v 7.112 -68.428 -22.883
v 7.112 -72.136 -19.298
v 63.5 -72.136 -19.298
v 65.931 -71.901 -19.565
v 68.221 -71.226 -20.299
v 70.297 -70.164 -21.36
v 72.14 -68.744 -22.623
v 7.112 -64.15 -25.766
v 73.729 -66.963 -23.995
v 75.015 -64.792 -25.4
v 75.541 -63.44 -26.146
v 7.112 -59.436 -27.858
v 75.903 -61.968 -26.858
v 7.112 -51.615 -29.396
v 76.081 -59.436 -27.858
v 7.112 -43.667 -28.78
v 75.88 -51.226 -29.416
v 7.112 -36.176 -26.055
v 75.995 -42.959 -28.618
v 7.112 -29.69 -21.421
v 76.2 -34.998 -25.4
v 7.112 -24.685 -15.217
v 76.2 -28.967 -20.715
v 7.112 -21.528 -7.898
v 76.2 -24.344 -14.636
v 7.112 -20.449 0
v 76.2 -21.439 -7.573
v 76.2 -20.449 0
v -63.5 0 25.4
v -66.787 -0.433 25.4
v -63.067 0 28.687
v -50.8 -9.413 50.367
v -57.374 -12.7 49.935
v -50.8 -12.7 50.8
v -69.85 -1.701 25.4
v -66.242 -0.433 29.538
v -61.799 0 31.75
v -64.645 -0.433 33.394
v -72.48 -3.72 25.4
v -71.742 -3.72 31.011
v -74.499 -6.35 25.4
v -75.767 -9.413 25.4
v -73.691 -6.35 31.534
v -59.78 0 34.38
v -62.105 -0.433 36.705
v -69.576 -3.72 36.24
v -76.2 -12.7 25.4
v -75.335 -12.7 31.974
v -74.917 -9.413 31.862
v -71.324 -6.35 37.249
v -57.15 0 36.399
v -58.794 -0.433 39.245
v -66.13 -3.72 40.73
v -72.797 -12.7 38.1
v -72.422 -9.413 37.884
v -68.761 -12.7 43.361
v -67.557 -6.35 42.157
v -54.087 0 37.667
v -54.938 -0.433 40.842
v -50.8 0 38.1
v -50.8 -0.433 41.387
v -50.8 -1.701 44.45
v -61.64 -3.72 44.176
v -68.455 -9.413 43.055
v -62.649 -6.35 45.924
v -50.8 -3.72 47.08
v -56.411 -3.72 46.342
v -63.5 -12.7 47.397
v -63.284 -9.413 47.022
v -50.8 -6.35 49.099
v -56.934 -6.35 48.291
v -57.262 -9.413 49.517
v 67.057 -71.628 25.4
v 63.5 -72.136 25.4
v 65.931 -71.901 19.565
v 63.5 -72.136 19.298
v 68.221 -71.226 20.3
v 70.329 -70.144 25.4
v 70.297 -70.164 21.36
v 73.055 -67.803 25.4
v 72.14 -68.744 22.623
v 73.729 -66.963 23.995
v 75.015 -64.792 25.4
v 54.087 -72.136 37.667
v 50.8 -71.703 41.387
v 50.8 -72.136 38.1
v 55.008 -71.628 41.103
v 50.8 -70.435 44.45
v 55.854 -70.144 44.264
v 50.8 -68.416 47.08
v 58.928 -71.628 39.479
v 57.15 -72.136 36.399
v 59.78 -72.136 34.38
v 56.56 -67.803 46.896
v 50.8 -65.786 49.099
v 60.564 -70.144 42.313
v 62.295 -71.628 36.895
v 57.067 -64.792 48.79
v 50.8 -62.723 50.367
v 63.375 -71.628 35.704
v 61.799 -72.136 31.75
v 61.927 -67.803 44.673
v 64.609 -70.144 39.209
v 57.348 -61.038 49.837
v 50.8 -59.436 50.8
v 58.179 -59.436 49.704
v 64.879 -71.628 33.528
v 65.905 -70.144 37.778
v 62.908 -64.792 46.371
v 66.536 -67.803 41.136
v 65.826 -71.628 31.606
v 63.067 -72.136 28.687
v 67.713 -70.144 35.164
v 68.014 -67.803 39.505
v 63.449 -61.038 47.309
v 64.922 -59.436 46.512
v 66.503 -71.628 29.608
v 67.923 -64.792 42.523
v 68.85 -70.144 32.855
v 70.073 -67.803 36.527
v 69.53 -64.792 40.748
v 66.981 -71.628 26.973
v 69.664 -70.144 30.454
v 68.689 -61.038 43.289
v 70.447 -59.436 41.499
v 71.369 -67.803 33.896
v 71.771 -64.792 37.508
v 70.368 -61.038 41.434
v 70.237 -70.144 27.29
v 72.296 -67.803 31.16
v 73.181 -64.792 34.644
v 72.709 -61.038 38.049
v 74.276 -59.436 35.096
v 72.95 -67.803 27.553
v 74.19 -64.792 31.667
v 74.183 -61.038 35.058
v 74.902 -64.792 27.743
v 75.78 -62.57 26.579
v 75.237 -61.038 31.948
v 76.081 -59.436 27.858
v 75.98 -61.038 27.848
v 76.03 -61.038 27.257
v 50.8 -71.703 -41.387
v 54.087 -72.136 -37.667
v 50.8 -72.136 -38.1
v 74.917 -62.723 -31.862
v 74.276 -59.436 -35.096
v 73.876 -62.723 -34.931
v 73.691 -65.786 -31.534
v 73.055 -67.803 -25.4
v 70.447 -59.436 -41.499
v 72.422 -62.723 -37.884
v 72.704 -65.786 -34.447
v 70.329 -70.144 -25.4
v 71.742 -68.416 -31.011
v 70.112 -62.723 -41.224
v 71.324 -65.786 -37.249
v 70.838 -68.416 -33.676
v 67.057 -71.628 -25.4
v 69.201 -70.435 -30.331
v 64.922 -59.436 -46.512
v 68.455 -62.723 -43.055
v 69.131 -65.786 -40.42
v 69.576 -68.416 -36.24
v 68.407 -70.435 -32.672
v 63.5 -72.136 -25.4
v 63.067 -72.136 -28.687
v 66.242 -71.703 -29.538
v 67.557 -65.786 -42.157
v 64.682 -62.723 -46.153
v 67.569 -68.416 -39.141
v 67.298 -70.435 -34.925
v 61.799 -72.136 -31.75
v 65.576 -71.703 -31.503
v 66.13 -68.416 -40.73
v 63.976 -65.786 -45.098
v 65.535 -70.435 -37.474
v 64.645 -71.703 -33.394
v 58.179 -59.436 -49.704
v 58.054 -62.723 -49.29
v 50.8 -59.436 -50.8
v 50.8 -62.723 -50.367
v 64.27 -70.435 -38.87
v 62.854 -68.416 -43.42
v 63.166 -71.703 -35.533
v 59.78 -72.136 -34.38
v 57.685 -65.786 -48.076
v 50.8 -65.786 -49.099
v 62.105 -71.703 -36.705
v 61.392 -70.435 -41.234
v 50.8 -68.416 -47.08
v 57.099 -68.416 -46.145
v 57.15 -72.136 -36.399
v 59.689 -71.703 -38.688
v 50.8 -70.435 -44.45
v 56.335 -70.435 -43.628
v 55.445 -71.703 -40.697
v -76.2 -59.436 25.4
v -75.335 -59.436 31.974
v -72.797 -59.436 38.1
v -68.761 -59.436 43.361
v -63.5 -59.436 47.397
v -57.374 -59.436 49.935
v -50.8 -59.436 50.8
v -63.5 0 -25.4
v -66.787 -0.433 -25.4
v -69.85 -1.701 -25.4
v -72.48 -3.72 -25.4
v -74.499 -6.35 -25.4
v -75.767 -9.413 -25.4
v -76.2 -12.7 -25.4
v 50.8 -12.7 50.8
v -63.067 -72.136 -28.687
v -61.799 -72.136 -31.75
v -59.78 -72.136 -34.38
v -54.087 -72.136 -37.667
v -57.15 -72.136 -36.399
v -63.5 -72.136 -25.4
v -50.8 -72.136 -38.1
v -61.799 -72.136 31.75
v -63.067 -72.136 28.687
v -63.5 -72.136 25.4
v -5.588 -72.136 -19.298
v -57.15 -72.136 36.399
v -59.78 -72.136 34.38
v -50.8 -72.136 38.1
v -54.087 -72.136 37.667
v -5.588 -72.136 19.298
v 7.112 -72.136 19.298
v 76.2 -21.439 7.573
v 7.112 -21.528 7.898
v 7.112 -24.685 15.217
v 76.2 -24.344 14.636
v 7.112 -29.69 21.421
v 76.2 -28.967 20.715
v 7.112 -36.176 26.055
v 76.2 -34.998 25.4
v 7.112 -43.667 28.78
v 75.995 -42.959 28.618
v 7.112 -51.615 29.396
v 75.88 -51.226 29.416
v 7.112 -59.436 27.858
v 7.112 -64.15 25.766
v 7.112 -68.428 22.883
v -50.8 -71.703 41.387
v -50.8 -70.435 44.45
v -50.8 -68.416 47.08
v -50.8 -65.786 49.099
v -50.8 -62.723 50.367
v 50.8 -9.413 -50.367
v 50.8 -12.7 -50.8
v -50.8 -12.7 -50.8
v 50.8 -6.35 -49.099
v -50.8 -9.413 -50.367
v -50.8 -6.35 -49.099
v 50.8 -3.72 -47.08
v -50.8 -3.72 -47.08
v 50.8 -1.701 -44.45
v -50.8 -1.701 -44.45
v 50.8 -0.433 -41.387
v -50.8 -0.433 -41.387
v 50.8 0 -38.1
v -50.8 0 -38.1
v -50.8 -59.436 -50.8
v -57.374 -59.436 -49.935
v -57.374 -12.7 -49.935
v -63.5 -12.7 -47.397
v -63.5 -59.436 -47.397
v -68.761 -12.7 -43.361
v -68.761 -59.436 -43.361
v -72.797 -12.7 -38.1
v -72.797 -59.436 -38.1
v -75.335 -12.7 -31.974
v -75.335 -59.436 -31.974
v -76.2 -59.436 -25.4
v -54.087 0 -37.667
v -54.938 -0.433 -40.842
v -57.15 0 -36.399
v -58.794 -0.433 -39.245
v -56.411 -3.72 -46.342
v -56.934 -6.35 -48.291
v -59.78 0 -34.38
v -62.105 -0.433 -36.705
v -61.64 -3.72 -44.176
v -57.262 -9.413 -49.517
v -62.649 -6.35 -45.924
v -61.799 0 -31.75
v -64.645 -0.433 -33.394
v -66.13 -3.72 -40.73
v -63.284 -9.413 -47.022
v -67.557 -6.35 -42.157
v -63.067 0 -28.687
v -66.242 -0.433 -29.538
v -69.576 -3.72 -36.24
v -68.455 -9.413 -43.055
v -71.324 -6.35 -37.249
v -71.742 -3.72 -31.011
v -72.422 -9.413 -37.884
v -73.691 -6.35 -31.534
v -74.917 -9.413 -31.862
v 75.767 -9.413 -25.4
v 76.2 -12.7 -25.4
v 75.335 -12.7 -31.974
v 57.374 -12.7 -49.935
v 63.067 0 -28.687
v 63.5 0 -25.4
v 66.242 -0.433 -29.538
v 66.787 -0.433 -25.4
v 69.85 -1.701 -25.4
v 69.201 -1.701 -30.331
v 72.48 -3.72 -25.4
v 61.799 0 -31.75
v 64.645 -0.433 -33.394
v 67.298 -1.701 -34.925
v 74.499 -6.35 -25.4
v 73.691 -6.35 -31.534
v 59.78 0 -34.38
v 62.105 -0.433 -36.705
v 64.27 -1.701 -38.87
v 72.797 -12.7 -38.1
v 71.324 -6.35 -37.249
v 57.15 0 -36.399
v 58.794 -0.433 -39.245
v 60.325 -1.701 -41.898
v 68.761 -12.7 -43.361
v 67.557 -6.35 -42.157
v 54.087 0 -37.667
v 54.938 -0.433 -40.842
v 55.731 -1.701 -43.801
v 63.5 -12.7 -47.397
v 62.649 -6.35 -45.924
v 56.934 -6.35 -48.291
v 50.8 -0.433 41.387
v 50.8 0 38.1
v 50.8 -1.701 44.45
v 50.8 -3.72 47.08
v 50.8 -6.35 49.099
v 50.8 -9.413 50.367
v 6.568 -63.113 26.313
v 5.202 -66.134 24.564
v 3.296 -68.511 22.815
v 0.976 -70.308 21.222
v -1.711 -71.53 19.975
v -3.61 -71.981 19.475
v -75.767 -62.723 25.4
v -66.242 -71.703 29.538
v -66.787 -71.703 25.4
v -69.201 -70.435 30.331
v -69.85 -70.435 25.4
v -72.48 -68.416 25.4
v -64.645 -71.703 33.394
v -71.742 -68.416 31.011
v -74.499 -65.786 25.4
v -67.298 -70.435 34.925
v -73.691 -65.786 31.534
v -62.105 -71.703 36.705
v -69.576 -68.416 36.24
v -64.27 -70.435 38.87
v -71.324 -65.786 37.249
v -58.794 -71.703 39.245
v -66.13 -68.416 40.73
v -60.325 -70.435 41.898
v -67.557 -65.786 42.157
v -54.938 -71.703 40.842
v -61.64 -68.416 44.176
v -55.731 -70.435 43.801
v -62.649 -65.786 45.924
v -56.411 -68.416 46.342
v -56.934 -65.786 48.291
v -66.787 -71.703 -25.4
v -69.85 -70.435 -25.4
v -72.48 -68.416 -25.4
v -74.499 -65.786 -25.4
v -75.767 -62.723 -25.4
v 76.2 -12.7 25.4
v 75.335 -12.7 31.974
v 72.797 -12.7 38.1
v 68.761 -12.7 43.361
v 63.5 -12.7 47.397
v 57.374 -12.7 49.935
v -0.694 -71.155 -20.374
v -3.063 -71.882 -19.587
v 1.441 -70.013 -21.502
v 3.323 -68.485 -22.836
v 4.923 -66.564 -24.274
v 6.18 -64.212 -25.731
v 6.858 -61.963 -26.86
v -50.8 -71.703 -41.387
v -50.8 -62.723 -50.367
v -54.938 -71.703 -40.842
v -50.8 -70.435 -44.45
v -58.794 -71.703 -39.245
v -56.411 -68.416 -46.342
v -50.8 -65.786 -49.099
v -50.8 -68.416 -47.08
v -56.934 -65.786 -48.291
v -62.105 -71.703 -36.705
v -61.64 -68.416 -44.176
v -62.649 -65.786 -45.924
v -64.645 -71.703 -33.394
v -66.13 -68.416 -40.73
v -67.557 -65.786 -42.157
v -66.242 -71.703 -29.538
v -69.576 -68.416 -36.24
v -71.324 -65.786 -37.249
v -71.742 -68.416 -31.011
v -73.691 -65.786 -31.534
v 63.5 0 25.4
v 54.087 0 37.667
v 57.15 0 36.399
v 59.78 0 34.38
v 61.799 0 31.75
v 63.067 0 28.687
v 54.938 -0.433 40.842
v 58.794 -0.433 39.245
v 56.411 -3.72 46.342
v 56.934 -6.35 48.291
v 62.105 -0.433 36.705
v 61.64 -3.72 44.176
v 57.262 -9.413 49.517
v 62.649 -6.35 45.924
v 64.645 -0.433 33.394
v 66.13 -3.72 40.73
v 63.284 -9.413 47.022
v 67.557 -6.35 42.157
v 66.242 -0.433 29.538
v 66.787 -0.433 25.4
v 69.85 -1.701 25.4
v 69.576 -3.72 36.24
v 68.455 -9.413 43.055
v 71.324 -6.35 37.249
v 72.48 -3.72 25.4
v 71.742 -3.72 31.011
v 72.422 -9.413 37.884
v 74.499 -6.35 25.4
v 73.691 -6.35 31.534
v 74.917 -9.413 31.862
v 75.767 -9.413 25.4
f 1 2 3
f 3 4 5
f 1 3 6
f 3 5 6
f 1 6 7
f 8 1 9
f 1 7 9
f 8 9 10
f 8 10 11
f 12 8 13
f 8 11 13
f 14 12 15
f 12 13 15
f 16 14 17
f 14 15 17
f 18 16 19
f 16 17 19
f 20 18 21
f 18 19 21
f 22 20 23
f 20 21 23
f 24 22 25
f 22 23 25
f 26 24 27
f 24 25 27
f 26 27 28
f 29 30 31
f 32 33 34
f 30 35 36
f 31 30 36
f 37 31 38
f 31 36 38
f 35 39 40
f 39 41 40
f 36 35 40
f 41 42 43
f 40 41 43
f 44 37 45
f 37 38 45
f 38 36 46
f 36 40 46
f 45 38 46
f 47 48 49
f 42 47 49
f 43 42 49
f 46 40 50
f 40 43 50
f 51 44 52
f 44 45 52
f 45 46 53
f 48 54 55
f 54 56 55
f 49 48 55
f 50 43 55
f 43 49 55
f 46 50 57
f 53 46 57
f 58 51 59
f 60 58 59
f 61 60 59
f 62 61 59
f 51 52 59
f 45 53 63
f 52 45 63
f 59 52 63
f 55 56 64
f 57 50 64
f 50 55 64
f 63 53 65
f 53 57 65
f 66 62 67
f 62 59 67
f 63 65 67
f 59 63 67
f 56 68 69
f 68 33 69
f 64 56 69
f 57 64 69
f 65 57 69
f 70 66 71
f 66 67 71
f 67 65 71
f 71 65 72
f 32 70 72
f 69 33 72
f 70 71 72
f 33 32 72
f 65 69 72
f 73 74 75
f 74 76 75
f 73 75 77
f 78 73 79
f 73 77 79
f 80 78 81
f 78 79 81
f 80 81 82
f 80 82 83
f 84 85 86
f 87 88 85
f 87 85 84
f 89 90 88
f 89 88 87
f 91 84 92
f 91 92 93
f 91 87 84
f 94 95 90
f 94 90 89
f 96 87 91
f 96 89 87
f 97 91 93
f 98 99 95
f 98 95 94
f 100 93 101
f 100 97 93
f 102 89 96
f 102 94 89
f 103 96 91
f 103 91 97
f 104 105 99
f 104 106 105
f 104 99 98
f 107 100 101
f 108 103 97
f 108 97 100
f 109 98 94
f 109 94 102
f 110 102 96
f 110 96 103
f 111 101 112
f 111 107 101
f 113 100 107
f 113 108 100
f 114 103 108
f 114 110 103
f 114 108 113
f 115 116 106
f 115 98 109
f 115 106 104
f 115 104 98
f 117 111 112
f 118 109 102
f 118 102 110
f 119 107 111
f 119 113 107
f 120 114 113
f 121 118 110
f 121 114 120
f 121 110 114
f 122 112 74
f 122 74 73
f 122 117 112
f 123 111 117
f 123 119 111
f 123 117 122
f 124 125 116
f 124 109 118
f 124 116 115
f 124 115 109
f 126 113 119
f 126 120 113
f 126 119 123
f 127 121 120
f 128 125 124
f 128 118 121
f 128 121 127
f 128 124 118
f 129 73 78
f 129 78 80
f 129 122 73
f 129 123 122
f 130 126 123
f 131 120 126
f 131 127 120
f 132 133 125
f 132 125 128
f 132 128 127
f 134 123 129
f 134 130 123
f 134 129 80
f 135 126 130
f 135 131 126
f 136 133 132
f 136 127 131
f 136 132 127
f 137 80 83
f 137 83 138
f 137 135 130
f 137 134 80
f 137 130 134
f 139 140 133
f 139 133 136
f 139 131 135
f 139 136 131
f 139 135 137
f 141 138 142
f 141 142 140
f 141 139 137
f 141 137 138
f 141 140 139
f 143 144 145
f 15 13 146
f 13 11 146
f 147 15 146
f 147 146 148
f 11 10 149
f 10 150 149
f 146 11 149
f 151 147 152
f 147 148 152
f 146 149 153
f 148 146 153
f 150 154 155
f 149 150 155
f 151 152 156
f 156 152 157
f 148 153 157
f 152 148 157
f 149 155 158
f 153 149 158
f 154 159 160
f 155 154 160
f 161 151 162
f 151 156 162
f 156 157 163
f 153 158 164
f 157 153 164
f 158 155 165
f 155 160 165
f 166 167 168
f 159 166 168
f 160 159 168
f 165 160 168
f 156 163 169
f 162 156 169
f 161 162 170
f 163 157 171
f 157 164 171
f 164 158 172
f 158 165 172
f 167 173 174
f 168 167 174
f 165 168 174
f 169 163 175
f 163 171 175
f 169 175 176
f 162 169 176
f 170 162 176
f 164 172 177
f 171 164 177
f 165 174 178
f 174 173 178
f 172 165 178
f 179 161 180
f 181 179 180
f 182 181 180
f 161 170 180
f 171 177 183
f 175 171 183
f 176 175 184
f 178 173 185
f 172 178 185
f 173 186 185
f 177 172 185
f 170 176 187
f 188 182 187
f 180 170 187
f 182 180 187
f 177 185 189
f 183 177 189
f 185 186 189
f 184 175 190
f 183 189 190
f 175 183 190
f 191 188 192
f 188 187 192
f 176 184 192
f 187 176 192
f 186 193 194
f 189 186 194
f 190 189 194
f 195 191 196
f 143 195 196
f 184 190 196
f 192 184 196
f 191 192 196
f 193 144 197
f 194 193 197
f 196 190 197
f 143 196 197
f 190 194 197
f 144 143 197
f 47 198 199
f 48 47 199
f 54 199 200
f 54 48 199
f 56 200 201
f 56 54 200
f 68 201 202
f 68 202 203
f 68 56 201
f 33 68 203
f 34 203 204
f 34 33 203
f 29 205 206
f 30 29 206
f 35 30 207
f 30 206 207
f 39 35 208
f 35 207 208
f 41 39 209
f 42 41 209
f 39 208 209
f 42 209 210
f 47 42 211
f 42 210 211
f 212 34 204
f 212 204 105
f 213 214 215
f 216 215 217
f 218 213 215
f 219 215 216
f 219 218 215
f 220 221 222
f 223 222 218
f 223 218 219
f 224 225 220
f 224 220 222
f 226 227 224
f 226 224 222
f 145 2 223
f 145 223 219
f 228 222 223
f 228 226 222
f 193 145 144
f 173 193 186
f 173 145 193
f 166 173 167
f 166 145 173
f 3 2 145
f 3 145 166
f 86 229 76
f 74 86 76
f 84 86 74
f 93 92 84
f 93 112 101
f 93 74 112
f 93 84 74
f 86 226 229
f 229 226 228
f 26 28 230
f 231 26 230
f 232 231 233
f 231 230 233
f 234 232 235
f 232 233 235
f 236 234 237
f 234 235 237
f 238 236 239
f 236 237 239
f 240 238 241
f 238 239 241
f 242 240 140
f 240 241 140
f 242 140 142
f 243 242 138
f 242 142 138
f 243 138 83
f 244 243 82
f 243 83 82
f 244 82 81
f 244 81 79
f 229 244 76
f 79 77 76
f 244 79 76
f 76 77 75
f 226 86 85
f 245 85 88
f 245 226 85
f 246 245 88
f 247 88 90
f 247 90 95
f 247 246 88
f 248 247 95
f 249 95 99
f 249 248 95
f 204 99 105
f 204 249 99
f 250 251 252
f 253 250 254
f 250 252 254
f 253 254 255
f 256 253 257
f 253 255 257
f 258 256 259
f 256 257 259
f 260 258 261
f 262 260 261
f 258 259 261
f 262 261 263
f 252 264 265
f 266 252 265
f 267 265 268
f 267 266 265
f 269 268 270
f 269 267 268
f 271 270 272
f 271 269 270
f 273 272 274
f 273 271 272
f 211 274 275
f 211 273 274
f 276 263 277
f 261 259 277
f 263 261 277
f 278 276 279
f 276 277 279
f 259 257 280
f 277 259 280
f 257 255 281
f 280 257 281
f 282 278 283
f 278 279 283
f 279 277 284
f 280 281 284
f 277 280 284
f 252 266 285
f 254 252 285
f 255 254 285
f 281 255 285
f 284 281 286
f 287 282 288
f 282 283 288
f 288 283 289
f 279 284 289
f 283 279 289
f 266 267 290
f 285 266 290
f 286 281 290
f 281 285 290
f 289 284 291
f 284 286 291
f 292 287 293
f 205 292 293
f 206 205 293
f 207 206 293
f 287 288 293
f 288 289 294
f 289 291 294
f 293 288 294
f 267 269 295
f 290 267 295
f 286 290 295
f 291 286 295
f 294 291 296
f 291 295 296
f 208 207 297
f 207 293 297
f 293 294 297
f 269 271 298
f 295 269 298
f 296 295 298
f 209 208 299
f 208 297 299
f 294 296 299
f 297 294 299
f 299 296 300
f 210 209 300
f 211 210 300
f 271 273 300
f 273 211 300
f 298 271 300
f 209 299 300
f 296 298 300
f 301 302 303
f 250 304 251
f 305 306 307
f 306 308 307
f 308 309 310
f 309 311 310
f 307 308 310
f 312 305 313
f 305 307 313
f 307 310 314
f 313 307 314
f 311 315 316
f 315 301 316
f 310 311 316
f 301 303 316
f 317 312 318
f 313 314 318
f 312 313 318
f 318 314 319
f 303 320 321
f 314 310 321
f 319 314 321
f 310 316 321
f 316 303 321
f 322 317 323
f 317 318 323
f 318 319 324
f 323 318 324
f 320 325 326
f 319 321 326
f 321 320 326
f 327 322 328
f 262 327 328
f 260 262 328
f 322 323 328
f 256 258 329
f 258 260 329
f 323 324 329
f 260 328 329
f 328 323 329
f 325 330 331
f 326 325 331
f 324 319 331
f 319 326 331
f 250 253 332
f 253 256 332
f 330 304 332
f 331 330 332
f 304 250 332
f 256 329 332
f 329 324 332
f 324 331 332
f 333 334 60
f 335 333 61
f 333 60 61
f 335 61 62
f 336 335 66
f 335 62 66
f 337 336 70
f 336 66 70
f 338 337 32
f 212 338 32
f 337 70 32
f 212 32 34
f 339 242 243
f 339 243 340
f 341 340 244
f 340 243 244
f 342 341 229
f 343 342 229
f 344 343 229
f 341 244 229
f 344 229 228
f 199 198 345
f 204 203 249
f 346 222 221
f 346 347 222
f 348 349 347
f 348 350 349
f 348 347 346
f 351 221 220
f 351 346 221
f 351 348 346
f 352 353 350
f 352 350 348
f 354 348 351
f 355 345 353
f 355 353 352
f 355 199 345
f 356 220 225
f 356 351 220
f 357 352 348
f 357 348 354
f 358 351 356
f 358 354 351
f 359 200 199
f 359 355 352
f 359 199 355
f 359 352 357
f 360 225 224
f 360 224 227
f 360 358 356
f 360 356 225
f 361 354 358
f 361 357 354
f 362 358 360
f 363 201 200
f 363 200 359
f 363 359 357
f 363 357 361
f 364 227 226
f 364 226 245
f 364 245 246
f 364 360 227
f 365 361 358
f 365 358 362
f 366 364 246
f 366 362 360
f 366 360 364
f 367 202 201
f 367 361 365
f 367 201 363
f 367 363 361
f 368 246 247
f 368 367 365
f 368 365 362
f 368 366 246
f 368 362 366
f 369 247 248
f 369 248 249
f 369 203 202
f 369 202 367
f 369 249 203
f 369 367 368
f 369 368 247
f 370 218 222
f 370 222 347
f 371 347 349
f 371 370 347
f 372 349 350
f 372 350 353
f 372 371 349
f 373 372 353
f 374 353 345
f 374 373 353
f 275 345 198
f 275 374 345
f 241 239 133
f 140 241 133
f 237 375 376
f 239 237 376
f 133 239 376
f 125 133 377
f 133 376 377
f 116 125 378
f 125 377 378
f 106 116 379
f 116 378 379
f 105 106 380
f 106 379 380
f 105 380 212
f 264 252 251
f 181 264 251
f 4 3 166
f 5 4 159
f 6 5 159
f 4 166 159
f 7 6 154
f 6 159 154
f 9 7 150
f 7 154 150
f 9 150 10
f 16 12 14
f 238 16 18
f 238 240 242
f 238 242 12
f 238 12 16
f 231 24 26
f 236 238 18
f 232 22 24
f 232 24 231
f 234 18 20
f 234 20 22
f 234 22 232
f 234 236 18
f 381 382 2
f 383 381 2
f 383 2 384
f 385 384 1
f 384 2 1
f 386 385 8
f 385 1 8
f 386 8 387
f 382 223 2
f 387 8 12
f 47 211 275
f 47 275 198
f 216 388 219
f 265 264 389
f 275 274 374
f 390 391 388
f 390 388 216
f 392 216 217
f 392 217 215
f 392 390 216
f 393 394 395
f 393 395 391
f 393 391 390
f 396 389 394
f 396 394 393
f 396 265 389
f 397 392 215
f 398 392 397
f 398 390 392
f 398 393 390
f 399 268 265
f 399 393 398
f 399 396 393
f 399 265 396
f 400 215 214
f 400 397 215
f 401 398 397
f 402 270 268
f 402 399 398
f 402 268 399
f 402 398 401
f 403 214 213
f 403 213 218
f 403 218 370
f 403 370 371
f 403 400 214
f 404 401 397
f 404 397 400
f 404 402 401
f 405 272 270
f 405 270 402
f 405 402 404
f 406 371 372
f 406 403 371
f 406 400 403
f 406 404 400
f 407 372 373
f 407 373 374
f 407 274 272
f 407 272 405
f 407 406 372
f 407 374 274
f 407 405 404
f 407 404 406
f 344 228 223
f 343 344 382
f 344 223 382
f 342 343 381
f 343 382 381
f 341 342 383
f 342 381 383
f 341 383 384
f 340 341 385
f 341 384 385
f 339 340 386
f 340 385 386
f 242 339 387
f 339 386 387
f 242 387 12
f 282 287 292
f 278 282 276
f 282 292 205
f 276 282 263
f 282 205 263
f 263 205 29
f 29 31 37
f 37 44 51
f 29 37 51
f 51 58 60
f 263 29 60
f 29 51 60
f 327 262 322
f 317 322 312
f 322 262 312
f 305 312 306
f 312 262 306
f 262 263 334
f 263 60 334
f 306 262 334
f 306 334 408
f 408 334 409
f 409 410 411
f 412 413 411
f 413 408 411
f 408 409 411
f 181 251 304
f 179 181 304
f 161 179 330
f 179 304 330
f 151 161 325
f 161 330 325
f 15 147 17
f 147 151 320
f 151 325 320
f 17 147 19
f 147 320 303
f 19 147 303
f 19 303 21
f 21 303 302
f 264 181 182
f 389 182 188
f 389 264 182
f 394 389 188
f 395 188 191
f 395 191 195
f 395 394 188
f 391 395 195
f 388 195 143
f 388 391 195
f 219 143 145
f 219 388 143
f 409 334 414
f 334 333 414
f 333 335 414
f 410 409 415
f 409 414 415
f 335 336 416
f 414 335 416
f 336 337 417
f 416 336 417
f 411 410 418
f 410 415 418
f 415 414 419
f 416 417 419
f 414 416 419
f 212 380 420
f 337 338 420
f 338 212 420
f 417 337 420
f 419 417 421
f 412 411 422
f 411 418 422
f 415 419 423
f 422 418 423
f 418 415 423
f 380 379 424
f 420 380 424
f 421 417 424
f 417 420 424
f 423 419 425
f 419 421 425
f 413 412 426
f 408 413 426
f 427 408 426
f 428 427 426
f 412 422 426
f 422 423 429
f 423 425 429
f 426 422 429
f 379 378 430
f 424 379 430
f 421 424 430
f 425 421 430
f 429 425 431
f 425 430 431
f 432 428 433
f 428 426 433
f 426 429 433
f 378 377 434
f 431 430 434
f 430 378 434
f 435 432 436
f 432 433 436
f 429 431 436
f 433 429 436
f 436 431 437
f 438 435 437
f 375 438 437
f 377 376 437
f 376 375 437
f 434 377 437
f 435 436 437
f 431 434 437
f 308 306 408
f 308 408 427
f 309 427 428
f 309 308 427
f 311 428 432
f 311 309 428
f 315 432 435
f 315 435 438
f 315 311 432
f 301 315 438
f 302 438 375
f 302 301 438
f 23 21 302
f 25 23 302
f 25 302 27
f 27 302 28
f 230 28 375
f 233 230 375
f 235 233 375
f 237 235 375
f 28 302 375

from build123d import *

# Parameters (mm, degrees)
F0_W         = 152.4
F0_H         = 101.6
F1_DEPTH     = 72.136
F3_DEPTH     = 69.088
F4_T1_DEPTH  = 199.136
F5_T1_DEPTH  = 101.6
F5_T3_DEPTH  = 50.8
F5_T5_DEPTH  = 37.8518945456
F5_T7_DEPTH  = 37.8518945456
F5_T12_DEPTH = 102.0962109088
F5_S13_R     = 29.4462721735
F5_T14_DEPTH = 53
F5_T16_ANGLE = 89.9999999994
F5_T18_ANGLE = 89.9999999994
F5_T20_ANGLE = 89.9999999994
F5_T22_ANGLE = 89.9999999994
F5_T24_ANGLE = 89.9999999994
F5_T26_ANGLE = 89.9999999994
F5_T28_ANGLE = 89.9999999994
F5_T30_ANGLE = 89.9999999994


# Not quite as in the source:
# - a fillet or chamfer that OpenCascade refuses, or shapes differently, is made with other operations: its cross-section is extruded or revolved along the edge and cut away or added


with BuildPart() as f1:
    # F0 (on Front) → F1 (new body)
    with BuildSketch(Plane.XZ):
        Rectangle(F0_W, F0_H)
    extrude(amount=F1_DEPTH)

    # F2 (on face) → F3 (cut)
    with BuildSketch(Plane.YZ.offset(76.2)):
        with BuildLine():
            Line((-72.136, -19.2981054544), (-72.136, 19.2981054544))
            ThreePointArc((-72.136, 19.2981054544), (-79.3411824793, 0), (-72.136, -19.2981054544))
        make_face()
        with BuildLine():
            ThreePointArc((-72.136, -19.2981054544), (-39.5952558372, -27.5862295855), (-20.4486381322, 0))
            ThreePointArc((-20.4486381322, 0), (-39.5952558372, 27.5862295855), (-72.136, 19.2981054544))
            Line((-72.136, 19.2981054544), (-72.136, -19.2981054544))
        make_face()
    extrude(amount=-F3_DEPTH, mode=Mode.SUBTRACT)

    # F4: fillet of radius 25.4 on 4 edges, made by hand

    # F4_s2 → F4_t1 (cut)
    with BuildSketch(Plane.XZ.offset(-63.5)):
        with BuildLine():
            ThreePointArc((50.8, -50.8), (68.7605122421, -43.3605122421), (76.2, -25.4))
            Line((76.2, -25.4), (76.2, -50.8))
            Line((76.2, -50.8), (50.8, -50.8))
        make_face()
        with BuildLine():
            ThreePointArc((-50.8, -50.8), (-68.7605122421, -43.3605122421), (-76.2, -25.4))
            Line((-76.2, -25.4), (-76.2, -50.8))
            Line((-76.2, -50.8), (-50.8, -50.8))
        make_face()
        with BuildLine():
            ThreePointArc((76.2, 25.4), (68.7605122421, 43.3605122421), (50.8, 50.8))
            Line((50.8, 50.8), (76.2, 50.8))
            Line((76.2, 50.8), (76.2, 25.4))
        make_face()
        with BuildLine():
            ThreePointArc((-76.2, 25.4), (-68.7605122421, 43.3605122421), (-50.8, 50.8))
            Line((-50.8, 50.8), (-76.2, 50.8))
            Line((-76.2, 50.8), (-76.2, 25.4))
        make_face()
    extrude(amount=F4_T1_DEPTH, mode=Mode.SUBTRACT)

    # F5: fillet of radius 12.7 on 16 edges, made by hand

    # F5_s2 → F5_t1 (cut)
    with BuildSketch(Plane.YZ.offset(-50.8)):
        with BuildLine():
            ThreePointArc((-72.136, 38.1), (-68.4162561211, 47.0802561211), (-59.436, 50.8))
            Line((-59.436, 50.8), (-72.136, 50.8))
            Line((-72.136, 50.8), (-72.136, 38.1))
        make_face()
        with BuildLine():
            ThreePointArc((0, 38.1), (-3.7197438789, 47.0802561211), (-12.7, 50.8))
            Line((-12.7, 50.8), (0, 50.8))
            Line((0, 50.8), (0, 38.1))
        make_face()
        with BuildLine():
            ThreePointArc((-12.7, -50.8), (-3.7197438789, -47.0802561211), (0, -38.1))
            Line((0, -38.1), (0, -50.8))
            Line((0, -50.8), (-12.7, -50.8))
        make_face()
        with BuildLine():
            ThreePointArc((-59.436, -50.8), (-68.4162561211, -47.0802561211), (-72.136, -38.1))
            Line((-72.136, -38.1), (-72.136, -50.8))
            Line((-72.136, -50.8), (-59.436, -50.8))
        make_face()
    extrude(amount=F5_T1_DEPTH, mode=Mode.SUBTRACT)

    # F5_s4 → F5_t3 (cut)
    with BuildSketch(Plane.XY.offset(-25.4)):
        with BuildLine():
            ThreePointArc((-63.5, 0), (-72.4802561211, -3.7197438789), (-76.2, -12.7))
            Line((-76.2, -12.7), (-76.2, 0))
            Line((-76.2, 0), (-63.5, 0))
        make_face()
        with BuildLine():
            ThreePointArc((63.5, 0), (72.4802561211, -3.7197438789), (76.2, -12.7))
            Line((76.2, -12.7), (76.2, 0))
            Line((76.2, 0), (63.5, 0))
        make_face()
        with BuildLine():
            ThreePointArc((-63.5, -72.136), (-72.4802561211, -68.4162561211), (-76.2, -59.436))
            Line((-76.2, -59.436), (-76.2, -72.136))
            Line((-76.2, -72.136), (-63.5, -72.136))
        make_face()
    extrude(amount=F5_T3_DEPTH, mode=Mode.SUBTRACT)

    # F5_s6 → F5_t5 (cut)
    with BuildSketch(Plane.XY.offset(-12.4518945456)):
        with BuildLine():
            ThreePointArc((63.5, -72.136), (72.4802561211, -68.4162561211), (76.2, -59.436))
            Line((76.2, -59.436), (76.2, -72.136))
            Line((76.2, -72.136), (63.5, -72.136))
        make_face()
    extrude(amount=F5_T5_DEPTH, mode=Mode.SUBTRACT)

    # F5_s8 → F5_t7 (cut)
    with BuildSketch(Plane.XY.offset(-25.4)):
        with BuildLine():
            ThreePointArc((63.5, -72.136), (72.4802561211, -68.4162561211), (76.2, -59.436))
            Line((76.2, -59.436), (76.2, -72.136))
            Line((76.2, -72.136), (63.5, -72.136))
        make_face()
    extrude(amount=F5_T7_DEPTH, mode=Mode.SUBTRACT)


with BuildPart() as f5_tool10:
    # F5_s11 → F5_t12 (new body)
    with BuildSketch(Plane.XY.offset(-51.0481054544)):
        with BuildLine():
            ThreePointArc((-5.588, -72.136), (3.3922561211, -68.4162561211), (7.112, -59.436))
            Line((7.112, -59.436), (7.112, -72.136))
            Line((7.112, -72.136), (-5.588, -72.136))
        make_face()
    extrude(amount=F5_T12_DEPTH)

    # F5_s13 → F5_t14 (intersect, symmetric)
    with BuildSketch(Plane.YZ.offset(0.8)):
        with Locations((-49.8949103057, 0)):
            Circle(F5_S13_R)
    extrude(amount=F5_T14_DEPTH, both=True, mode=Mode.INTERSECT)


with BuildPart() as f1_1:
    add(f1.part)

    # F5_t9: cut F5_tool10
    add(f5_tool10.part, mode=Mode.SUBTRACT)

    # F5_s15 → F5_t16 (revolve, cut)
    with BuildSketch(Plane.YZ.offset(-50.7999999999)):
        with BuildLine():
            ThreePointArc((0, -38.1), (-3.7197438789, -47.0802561211), (-12.7, -50.8))
            Line((-12.7, -50.8), (0, -50.8))
            Line((0, -50.8), (0, -38.1))
        make_face()
    revolve(axis=Axis((-50.7999999999, 0, -25.3999999999), (0, 1, 0)), revolution_arc=F5_T16_ANGLE, mode=Mode.SUBTRACT)

    # F5_s17 → F5_t18 (revolve, cut)
    with BuildSketch(Plane.XY.offset(25.3999999999)):
        with BuildLine():
            ThreePointArc((-63.5, 0), (-72.4802561211, -3.7197438789), (-76.2, -12.7))
            Line((-76.2, -12.7), (-76.2, 0))
            Line((-76.2, 0), (-63.5, 0))
        make_face()
    revolve(axis=Axis((-50.7999999999, 0, 25.3999999999), (0, 1, 0)), revolution_arc=F5_T18_ANGLE, mode=Mode.SUBTRACT)

    # F5_s19 → F5_t20 (revolve, cut)
    with BuildSketch(Plane.YZ.offset(50.7999999999)):
        with BuildLine():
            ThreePointArc((0, 38.1), (-3.7197438789, 47.0802561211), (-12.7, 50.8))
            Line((-12.7, 50.8), (0, 50.8))
            Line((0, 50.8), (0, 38.1))
        make_face()
    revolve(axis=Axis((50.7999999999, 0, 25.3999999999), (0, 1, 0)), revolution_arc=F5_T20_ANGLE, mode=Mode.SUBTRACT)

    # F5_s21 → F5_t22 (revolve, cut)
    with BuildSketch(Plane.XY.offset(-25.3999999999)):
        with BuildLine():
            ThreePointArc((63.5, 0), (72.4802561211, -3.7197438789), (76.2, -12.7))
            Line((76.2, -12.7), (76.2, 0))
            Line((76.2, 0), (63.5, 0))
        make_face()
    revolve(axis=Axis((50.7999999999, 0, -25.3999999999), (0, 1, 0)), revolution_arc=F5_T22_ANGLE, mode=Mode.SUBTRACT)

    # F5_s23 → F5_t24 (revolve, cut)
    with BuildSketch(Plane.XY.offset(-25.3999999999)):
        with BuildLine():
            ThreePointArc((76.2, -59.436), (72.4802561211, -68.4162561211), (63.5, -72.136))
            Line((63.5, -72.136), (76.2, -72.136))
            Line((76.2, -72.136), (76.2, -59.436))
        make_face()
    revolve(axis=Axis((50.7999999999, -72.136, -25.3999999999), (0, 1, 0)), revolution_arc=F5_T24_ANGLE, mode=Mode.SUBTRACT)

    # F5_s25 → F5_t26 (revolve, cut)
    with BuildSketch(Plane.XY.offset(25.3999999999)):
        with BuildLine():
            ThreePointArc((-63.5, -72.136), (-72.4802561211, -68.4162561211), (-76.2, -59.436))
            Line((-76.2, -59.436), (-76.2, -72.136))
            Line((-76.2, -72.136), (-63.5, -72.136))
        make_face()
    revolve(axis=Axis((-50.7999999999, -72.136, 25.3999999999), (0, 1, 0)), revolution_arc=F5_T26_ANGLE, mode=Mode.SUBTRACT)

    # F5_s27 → F5_t28 (revolve, cut)
    with BuildSketch(Plane.YZ.offset(50.7999999999)):
        with BuildLine():
            ThreePointArc((-72.136, 38.1), (-68.4162561211, 47.0802561211), (-59.436, 50.8))
            Line((-59.436, 50.8), (-72.136, 50.8))
            Line((-72.136, 50.8), (-72.136, 38.1))
        make_face()
    revolve(axis=Axis((50.7999999999, -72.136, 25.3999999999), (0, 1, 0)), revolution_arc=F5_T28_ANGLE, mode=Mode.SUBTRACT)

    # F5_s29 → F5_t30 (revolve, cut)
    with BuildSketch(Plane.YZ.offset(-50.7999999999)):
        with BuildLine():
            ThreePointArc((-72.136, -38.1), (-68.4162561211, -47.0802561211), (-59.436, -50.8))
            Line((-59.436, -50.8), (-72.136, -50.8))
            Line((-72.136, -50.8), (-72.136, -38.1))
        make_face()
    revolve(axis=Axis((-50.7999999999, -72.136, -25.3999999999), (0, 1, 0)), revolution_arc=F5_T30_ANGLE, mode=Mode.SUBTRACT)


solid = f1_1.part
